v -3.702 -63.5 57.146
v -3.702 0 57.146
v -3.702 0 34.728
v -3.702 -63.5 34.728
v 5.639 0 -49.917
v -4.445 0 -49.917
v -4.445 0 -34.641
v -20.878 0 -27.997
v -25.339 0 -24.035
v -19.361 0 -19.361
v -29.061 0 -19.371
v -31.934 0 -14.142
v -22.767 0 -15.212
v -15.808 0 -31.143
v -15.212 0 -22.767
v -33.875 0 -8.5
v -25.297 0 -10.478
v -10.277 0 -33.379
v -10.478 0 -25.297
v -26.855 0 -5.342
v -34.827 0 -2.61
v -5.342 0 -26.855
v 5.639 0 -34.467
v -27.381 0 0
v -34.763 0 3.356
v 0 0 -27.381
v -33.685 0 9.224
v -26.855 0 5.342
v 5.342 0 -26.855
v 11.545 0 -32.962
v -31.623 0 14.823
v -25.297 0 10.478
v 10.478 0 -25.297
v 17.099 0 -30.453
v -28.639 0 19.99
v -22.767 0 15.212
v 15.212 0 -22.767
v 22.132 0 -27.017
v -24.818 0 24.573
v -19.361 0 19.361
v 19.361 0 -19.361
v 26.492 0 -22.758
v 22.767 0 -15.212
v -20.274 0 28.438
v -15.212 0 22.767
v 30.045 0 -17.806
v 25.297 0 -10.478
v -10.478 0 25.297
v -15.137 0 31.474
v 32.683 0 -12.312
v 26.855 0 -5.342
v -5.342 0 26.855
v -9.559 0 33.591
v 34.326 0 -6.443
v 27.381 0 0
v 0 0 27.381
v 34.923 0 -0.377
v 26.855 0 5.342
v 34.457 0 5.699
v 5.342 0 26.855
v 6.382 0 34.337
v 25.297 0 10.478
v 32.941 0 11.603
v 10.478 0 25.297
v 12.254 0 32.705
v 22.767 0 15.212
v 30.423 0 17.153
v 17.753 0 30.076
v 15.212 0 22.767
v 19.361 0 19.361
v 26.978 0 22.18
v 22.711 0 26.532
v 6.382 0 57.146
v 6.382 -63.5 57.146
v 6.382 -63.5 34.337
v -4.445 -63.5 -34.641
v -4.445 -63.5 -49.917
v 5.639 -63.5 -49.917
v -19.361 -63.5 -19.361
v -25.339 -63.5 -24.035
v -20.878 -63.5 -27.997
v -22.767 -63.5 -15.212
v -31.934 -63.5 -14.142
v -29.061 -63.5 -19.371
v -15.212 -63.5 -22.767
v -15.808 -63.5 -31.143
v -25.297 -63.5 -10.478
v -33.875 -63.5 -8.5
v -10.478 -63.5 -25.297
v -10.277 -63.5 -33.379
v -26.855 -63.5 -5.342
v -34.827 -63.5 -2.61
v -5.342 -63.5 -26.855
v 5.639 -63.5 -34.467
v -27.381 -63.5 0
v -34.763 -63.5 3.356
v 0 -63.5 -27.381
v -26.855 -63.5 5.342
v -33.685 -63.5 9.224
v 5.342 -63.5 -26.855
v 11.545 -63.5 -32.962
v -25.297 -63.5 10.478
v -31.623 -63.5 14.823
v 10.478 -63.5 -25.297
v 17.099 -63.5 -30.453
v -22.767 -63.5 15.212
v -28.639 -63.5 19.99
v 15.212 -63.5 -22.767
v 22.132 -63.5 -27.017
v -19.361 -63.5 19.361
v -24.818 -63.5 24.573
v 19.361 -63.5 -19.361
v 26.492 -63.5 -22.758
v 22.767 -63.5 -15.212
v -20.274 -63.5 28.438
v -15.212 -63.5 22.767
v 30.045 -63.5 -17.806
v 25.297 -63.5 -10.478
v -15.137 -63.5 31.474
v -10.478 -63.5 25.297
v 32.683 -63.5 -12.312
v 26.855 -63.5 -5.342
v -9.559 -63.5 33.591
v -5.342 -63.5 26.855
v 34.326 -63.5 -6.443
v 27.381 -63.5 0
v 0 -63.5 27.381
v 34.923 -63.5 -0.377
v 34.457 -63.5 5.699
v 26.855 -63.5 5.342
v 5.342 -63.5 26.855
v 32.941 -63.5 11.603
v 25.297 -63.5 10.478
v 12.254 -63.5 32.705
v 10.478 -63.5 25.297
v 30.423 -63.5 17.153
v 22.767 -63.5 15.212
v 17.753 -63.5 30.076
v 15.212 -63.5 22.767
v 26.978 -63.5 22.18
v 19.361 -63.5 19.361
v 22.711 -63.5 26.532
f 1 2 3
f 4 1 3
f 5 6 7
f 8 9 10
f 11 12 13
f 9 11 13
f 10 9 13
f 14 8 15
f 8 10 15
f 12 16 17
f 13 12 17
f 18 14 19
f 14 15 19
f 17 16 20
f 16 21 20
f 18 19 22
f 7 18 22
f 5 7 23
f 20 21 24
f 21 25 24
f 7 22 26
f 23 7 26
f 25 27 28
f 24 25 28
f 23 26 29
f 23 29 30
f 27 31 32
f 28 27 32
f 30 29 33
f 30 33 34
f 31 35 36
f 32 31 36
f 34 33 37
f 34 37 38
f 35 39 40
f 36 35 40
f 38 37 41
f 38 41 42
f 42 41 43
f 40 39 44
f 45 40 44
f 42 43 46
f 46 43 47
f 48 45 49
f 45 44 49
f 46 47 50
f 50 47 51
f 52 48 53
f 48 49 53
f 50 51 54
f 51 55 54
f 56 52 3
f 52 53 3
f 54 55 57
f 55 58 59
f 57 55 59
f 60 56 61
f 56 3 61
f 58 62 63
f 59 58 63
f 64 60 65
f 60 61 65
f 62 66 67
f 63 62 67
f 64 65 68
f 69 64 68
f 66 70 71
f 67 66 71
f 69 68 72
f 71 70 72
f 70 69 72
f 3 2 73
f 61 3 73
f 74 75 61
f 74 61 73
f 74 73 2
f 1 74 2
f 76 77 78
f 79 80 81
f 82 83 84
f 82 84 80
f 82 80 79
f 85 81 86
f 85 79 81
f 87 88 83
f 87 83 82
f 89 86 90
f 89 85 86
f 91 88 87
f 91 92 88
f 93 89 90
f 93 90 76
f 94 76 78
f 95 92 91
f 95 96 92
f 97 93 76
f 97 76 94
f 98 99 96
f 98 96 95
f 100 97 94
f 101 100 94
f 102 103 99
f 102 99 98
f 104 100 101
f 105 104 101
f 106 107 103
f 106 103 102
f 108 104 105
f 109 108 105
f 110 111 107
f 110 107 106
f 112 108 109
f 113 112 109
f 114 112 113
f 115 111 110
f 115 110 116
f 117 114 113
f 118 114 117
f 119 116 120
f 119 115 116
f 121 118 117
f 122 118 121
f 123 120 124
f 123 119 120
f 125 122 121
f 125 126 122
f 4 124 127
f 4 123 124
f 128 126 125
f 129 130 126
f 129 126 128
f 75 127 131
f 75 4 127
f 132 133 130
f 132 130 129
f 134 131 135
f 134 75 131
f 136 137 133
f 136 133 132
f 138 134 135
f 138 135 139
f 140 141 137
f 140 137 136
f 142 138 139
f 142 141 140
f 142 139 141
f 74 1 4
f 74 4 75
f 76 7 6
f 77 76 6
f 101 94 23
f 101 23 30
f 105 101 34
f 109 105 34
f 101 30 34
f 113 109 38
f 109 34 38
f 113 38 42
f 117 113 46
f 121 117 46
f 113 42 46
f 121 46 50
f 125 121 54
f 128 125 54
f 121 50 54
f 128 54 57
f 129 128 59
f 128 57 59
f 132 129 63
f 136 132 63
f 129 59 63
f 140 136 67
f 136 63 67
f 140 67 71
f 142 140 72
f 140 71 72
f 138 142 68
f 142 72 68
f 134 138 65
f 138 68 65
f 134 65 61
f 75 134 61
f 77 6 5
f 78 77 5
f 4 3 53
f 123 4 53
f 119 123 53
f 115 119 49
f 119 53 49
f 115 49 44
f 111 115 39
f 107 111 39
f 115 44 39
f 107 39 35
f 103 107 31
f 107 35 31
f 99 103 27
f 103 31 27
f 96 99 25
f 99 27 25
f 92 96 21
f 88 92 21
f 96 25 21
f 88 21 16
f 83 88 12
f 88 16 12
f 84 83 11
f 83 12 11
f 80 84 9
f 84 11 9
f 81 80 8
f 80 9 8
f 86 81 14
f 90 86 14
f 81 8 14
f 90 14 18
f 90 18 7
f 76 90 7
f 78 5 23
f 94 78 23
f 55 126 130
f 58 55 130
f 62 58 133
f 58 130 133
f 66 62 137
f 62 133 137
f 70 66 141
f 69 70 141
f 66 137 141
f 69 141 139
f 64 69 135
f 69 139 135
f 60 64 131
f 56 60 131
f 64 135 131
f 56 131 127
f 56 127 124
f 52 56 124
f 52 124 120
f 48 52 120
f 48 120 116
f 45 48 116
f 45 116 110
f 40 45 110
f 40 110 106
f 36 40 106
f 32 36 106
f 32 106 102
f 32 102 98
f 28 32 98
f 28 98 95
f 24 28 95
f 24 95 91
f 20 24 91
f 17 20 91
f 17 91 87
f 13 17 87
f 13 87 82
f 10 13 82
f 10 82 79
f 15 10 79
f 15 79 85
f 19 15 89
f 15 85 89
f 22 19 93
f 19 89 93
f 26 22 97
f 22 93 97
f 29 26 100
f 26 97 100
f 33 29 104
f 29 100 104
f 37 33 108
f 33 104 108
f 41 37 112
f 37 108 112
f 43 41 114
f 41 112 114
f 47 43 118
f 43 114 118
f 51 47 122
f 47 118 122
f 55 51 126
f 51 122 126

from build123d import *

# Parameters (mm, degrees)
F1_DEPTH = 63.5
F2_R     = 27.3812
F3_DEPTH = 101.6


# Not quite as in the source:
# - a feature names something its author has since deleted; it is built from what else it names


with BuildPart() as f1:
    # F0 (on Front) → F1 (new body)
    with BuildSketch(Plane.XZ):
        with BuildLine():
            ThreePointArc((-3.7017028225, 34.7282740892), (1.3544064685, 34.8987278868), (6.3820971775, 34.3369256139))
            Line((6.3820971775, 34.3369256139), (6.3820971775, 57.1461256139))
            Line((6.3820971775, 57.1461256139), (-3.7017028225, 57.1461256139))
            Line((-3.7017028225, 57.1461256139), (-3.7017028225, 34.7282740892))
        make_face()
        with BuildLine():
            Line((5.6386164435, -49.9173291028), (5.6386164435, -34.4668192557))
            ThreePointArc((5.6386164435, -34.4668192557), (0.6030353105, -34.9197934332), (-4.4451835565, -34.6409579566))
            Line((-4.4451835565, -34.6409579566), (-4.4451835565, -49.9173291028))
            Line((-4.4451835565, -49.9173291028), (5.6386164435, -49.9173291028))
        make_face()
        with BuildLine():
            ThreePointArc((5.6386164435, -34.4668192557), (26.6146980472, -22.6144527428), (34.925, 0))
            ThreePointArc((34.925, 0), (26.8574977327, 22.3255557722), (6.3820971775, 34.3369256139))
            ThreePointArc((6.3820971775, 34.3369256139), (1.3544064685, 34.8987278868), (-3.7017028225, 34.7282740892))
            ThreePointArc((-3.7017028225, 34.7282740892), (-34.9229942598, 0.3742952407), (-4.4451835565, -34.6409579566))
            ThreePointArc((-4.4451835565, -34.6409579566), (0.6030353105, -34.9197934332), (5.6386164435, -34.4668192557))
        make_face()
    extrude(amount=F1_DEPTH)

    # F2 (on face) → F3 (cut)
    with BuildSketch(Plane.XZ.offset(63.5)):
        Circle(F2_R)
    extrude(amount=-F3_DEPTH, mode=Mode.SUBTRACT)


solid = f1.part
